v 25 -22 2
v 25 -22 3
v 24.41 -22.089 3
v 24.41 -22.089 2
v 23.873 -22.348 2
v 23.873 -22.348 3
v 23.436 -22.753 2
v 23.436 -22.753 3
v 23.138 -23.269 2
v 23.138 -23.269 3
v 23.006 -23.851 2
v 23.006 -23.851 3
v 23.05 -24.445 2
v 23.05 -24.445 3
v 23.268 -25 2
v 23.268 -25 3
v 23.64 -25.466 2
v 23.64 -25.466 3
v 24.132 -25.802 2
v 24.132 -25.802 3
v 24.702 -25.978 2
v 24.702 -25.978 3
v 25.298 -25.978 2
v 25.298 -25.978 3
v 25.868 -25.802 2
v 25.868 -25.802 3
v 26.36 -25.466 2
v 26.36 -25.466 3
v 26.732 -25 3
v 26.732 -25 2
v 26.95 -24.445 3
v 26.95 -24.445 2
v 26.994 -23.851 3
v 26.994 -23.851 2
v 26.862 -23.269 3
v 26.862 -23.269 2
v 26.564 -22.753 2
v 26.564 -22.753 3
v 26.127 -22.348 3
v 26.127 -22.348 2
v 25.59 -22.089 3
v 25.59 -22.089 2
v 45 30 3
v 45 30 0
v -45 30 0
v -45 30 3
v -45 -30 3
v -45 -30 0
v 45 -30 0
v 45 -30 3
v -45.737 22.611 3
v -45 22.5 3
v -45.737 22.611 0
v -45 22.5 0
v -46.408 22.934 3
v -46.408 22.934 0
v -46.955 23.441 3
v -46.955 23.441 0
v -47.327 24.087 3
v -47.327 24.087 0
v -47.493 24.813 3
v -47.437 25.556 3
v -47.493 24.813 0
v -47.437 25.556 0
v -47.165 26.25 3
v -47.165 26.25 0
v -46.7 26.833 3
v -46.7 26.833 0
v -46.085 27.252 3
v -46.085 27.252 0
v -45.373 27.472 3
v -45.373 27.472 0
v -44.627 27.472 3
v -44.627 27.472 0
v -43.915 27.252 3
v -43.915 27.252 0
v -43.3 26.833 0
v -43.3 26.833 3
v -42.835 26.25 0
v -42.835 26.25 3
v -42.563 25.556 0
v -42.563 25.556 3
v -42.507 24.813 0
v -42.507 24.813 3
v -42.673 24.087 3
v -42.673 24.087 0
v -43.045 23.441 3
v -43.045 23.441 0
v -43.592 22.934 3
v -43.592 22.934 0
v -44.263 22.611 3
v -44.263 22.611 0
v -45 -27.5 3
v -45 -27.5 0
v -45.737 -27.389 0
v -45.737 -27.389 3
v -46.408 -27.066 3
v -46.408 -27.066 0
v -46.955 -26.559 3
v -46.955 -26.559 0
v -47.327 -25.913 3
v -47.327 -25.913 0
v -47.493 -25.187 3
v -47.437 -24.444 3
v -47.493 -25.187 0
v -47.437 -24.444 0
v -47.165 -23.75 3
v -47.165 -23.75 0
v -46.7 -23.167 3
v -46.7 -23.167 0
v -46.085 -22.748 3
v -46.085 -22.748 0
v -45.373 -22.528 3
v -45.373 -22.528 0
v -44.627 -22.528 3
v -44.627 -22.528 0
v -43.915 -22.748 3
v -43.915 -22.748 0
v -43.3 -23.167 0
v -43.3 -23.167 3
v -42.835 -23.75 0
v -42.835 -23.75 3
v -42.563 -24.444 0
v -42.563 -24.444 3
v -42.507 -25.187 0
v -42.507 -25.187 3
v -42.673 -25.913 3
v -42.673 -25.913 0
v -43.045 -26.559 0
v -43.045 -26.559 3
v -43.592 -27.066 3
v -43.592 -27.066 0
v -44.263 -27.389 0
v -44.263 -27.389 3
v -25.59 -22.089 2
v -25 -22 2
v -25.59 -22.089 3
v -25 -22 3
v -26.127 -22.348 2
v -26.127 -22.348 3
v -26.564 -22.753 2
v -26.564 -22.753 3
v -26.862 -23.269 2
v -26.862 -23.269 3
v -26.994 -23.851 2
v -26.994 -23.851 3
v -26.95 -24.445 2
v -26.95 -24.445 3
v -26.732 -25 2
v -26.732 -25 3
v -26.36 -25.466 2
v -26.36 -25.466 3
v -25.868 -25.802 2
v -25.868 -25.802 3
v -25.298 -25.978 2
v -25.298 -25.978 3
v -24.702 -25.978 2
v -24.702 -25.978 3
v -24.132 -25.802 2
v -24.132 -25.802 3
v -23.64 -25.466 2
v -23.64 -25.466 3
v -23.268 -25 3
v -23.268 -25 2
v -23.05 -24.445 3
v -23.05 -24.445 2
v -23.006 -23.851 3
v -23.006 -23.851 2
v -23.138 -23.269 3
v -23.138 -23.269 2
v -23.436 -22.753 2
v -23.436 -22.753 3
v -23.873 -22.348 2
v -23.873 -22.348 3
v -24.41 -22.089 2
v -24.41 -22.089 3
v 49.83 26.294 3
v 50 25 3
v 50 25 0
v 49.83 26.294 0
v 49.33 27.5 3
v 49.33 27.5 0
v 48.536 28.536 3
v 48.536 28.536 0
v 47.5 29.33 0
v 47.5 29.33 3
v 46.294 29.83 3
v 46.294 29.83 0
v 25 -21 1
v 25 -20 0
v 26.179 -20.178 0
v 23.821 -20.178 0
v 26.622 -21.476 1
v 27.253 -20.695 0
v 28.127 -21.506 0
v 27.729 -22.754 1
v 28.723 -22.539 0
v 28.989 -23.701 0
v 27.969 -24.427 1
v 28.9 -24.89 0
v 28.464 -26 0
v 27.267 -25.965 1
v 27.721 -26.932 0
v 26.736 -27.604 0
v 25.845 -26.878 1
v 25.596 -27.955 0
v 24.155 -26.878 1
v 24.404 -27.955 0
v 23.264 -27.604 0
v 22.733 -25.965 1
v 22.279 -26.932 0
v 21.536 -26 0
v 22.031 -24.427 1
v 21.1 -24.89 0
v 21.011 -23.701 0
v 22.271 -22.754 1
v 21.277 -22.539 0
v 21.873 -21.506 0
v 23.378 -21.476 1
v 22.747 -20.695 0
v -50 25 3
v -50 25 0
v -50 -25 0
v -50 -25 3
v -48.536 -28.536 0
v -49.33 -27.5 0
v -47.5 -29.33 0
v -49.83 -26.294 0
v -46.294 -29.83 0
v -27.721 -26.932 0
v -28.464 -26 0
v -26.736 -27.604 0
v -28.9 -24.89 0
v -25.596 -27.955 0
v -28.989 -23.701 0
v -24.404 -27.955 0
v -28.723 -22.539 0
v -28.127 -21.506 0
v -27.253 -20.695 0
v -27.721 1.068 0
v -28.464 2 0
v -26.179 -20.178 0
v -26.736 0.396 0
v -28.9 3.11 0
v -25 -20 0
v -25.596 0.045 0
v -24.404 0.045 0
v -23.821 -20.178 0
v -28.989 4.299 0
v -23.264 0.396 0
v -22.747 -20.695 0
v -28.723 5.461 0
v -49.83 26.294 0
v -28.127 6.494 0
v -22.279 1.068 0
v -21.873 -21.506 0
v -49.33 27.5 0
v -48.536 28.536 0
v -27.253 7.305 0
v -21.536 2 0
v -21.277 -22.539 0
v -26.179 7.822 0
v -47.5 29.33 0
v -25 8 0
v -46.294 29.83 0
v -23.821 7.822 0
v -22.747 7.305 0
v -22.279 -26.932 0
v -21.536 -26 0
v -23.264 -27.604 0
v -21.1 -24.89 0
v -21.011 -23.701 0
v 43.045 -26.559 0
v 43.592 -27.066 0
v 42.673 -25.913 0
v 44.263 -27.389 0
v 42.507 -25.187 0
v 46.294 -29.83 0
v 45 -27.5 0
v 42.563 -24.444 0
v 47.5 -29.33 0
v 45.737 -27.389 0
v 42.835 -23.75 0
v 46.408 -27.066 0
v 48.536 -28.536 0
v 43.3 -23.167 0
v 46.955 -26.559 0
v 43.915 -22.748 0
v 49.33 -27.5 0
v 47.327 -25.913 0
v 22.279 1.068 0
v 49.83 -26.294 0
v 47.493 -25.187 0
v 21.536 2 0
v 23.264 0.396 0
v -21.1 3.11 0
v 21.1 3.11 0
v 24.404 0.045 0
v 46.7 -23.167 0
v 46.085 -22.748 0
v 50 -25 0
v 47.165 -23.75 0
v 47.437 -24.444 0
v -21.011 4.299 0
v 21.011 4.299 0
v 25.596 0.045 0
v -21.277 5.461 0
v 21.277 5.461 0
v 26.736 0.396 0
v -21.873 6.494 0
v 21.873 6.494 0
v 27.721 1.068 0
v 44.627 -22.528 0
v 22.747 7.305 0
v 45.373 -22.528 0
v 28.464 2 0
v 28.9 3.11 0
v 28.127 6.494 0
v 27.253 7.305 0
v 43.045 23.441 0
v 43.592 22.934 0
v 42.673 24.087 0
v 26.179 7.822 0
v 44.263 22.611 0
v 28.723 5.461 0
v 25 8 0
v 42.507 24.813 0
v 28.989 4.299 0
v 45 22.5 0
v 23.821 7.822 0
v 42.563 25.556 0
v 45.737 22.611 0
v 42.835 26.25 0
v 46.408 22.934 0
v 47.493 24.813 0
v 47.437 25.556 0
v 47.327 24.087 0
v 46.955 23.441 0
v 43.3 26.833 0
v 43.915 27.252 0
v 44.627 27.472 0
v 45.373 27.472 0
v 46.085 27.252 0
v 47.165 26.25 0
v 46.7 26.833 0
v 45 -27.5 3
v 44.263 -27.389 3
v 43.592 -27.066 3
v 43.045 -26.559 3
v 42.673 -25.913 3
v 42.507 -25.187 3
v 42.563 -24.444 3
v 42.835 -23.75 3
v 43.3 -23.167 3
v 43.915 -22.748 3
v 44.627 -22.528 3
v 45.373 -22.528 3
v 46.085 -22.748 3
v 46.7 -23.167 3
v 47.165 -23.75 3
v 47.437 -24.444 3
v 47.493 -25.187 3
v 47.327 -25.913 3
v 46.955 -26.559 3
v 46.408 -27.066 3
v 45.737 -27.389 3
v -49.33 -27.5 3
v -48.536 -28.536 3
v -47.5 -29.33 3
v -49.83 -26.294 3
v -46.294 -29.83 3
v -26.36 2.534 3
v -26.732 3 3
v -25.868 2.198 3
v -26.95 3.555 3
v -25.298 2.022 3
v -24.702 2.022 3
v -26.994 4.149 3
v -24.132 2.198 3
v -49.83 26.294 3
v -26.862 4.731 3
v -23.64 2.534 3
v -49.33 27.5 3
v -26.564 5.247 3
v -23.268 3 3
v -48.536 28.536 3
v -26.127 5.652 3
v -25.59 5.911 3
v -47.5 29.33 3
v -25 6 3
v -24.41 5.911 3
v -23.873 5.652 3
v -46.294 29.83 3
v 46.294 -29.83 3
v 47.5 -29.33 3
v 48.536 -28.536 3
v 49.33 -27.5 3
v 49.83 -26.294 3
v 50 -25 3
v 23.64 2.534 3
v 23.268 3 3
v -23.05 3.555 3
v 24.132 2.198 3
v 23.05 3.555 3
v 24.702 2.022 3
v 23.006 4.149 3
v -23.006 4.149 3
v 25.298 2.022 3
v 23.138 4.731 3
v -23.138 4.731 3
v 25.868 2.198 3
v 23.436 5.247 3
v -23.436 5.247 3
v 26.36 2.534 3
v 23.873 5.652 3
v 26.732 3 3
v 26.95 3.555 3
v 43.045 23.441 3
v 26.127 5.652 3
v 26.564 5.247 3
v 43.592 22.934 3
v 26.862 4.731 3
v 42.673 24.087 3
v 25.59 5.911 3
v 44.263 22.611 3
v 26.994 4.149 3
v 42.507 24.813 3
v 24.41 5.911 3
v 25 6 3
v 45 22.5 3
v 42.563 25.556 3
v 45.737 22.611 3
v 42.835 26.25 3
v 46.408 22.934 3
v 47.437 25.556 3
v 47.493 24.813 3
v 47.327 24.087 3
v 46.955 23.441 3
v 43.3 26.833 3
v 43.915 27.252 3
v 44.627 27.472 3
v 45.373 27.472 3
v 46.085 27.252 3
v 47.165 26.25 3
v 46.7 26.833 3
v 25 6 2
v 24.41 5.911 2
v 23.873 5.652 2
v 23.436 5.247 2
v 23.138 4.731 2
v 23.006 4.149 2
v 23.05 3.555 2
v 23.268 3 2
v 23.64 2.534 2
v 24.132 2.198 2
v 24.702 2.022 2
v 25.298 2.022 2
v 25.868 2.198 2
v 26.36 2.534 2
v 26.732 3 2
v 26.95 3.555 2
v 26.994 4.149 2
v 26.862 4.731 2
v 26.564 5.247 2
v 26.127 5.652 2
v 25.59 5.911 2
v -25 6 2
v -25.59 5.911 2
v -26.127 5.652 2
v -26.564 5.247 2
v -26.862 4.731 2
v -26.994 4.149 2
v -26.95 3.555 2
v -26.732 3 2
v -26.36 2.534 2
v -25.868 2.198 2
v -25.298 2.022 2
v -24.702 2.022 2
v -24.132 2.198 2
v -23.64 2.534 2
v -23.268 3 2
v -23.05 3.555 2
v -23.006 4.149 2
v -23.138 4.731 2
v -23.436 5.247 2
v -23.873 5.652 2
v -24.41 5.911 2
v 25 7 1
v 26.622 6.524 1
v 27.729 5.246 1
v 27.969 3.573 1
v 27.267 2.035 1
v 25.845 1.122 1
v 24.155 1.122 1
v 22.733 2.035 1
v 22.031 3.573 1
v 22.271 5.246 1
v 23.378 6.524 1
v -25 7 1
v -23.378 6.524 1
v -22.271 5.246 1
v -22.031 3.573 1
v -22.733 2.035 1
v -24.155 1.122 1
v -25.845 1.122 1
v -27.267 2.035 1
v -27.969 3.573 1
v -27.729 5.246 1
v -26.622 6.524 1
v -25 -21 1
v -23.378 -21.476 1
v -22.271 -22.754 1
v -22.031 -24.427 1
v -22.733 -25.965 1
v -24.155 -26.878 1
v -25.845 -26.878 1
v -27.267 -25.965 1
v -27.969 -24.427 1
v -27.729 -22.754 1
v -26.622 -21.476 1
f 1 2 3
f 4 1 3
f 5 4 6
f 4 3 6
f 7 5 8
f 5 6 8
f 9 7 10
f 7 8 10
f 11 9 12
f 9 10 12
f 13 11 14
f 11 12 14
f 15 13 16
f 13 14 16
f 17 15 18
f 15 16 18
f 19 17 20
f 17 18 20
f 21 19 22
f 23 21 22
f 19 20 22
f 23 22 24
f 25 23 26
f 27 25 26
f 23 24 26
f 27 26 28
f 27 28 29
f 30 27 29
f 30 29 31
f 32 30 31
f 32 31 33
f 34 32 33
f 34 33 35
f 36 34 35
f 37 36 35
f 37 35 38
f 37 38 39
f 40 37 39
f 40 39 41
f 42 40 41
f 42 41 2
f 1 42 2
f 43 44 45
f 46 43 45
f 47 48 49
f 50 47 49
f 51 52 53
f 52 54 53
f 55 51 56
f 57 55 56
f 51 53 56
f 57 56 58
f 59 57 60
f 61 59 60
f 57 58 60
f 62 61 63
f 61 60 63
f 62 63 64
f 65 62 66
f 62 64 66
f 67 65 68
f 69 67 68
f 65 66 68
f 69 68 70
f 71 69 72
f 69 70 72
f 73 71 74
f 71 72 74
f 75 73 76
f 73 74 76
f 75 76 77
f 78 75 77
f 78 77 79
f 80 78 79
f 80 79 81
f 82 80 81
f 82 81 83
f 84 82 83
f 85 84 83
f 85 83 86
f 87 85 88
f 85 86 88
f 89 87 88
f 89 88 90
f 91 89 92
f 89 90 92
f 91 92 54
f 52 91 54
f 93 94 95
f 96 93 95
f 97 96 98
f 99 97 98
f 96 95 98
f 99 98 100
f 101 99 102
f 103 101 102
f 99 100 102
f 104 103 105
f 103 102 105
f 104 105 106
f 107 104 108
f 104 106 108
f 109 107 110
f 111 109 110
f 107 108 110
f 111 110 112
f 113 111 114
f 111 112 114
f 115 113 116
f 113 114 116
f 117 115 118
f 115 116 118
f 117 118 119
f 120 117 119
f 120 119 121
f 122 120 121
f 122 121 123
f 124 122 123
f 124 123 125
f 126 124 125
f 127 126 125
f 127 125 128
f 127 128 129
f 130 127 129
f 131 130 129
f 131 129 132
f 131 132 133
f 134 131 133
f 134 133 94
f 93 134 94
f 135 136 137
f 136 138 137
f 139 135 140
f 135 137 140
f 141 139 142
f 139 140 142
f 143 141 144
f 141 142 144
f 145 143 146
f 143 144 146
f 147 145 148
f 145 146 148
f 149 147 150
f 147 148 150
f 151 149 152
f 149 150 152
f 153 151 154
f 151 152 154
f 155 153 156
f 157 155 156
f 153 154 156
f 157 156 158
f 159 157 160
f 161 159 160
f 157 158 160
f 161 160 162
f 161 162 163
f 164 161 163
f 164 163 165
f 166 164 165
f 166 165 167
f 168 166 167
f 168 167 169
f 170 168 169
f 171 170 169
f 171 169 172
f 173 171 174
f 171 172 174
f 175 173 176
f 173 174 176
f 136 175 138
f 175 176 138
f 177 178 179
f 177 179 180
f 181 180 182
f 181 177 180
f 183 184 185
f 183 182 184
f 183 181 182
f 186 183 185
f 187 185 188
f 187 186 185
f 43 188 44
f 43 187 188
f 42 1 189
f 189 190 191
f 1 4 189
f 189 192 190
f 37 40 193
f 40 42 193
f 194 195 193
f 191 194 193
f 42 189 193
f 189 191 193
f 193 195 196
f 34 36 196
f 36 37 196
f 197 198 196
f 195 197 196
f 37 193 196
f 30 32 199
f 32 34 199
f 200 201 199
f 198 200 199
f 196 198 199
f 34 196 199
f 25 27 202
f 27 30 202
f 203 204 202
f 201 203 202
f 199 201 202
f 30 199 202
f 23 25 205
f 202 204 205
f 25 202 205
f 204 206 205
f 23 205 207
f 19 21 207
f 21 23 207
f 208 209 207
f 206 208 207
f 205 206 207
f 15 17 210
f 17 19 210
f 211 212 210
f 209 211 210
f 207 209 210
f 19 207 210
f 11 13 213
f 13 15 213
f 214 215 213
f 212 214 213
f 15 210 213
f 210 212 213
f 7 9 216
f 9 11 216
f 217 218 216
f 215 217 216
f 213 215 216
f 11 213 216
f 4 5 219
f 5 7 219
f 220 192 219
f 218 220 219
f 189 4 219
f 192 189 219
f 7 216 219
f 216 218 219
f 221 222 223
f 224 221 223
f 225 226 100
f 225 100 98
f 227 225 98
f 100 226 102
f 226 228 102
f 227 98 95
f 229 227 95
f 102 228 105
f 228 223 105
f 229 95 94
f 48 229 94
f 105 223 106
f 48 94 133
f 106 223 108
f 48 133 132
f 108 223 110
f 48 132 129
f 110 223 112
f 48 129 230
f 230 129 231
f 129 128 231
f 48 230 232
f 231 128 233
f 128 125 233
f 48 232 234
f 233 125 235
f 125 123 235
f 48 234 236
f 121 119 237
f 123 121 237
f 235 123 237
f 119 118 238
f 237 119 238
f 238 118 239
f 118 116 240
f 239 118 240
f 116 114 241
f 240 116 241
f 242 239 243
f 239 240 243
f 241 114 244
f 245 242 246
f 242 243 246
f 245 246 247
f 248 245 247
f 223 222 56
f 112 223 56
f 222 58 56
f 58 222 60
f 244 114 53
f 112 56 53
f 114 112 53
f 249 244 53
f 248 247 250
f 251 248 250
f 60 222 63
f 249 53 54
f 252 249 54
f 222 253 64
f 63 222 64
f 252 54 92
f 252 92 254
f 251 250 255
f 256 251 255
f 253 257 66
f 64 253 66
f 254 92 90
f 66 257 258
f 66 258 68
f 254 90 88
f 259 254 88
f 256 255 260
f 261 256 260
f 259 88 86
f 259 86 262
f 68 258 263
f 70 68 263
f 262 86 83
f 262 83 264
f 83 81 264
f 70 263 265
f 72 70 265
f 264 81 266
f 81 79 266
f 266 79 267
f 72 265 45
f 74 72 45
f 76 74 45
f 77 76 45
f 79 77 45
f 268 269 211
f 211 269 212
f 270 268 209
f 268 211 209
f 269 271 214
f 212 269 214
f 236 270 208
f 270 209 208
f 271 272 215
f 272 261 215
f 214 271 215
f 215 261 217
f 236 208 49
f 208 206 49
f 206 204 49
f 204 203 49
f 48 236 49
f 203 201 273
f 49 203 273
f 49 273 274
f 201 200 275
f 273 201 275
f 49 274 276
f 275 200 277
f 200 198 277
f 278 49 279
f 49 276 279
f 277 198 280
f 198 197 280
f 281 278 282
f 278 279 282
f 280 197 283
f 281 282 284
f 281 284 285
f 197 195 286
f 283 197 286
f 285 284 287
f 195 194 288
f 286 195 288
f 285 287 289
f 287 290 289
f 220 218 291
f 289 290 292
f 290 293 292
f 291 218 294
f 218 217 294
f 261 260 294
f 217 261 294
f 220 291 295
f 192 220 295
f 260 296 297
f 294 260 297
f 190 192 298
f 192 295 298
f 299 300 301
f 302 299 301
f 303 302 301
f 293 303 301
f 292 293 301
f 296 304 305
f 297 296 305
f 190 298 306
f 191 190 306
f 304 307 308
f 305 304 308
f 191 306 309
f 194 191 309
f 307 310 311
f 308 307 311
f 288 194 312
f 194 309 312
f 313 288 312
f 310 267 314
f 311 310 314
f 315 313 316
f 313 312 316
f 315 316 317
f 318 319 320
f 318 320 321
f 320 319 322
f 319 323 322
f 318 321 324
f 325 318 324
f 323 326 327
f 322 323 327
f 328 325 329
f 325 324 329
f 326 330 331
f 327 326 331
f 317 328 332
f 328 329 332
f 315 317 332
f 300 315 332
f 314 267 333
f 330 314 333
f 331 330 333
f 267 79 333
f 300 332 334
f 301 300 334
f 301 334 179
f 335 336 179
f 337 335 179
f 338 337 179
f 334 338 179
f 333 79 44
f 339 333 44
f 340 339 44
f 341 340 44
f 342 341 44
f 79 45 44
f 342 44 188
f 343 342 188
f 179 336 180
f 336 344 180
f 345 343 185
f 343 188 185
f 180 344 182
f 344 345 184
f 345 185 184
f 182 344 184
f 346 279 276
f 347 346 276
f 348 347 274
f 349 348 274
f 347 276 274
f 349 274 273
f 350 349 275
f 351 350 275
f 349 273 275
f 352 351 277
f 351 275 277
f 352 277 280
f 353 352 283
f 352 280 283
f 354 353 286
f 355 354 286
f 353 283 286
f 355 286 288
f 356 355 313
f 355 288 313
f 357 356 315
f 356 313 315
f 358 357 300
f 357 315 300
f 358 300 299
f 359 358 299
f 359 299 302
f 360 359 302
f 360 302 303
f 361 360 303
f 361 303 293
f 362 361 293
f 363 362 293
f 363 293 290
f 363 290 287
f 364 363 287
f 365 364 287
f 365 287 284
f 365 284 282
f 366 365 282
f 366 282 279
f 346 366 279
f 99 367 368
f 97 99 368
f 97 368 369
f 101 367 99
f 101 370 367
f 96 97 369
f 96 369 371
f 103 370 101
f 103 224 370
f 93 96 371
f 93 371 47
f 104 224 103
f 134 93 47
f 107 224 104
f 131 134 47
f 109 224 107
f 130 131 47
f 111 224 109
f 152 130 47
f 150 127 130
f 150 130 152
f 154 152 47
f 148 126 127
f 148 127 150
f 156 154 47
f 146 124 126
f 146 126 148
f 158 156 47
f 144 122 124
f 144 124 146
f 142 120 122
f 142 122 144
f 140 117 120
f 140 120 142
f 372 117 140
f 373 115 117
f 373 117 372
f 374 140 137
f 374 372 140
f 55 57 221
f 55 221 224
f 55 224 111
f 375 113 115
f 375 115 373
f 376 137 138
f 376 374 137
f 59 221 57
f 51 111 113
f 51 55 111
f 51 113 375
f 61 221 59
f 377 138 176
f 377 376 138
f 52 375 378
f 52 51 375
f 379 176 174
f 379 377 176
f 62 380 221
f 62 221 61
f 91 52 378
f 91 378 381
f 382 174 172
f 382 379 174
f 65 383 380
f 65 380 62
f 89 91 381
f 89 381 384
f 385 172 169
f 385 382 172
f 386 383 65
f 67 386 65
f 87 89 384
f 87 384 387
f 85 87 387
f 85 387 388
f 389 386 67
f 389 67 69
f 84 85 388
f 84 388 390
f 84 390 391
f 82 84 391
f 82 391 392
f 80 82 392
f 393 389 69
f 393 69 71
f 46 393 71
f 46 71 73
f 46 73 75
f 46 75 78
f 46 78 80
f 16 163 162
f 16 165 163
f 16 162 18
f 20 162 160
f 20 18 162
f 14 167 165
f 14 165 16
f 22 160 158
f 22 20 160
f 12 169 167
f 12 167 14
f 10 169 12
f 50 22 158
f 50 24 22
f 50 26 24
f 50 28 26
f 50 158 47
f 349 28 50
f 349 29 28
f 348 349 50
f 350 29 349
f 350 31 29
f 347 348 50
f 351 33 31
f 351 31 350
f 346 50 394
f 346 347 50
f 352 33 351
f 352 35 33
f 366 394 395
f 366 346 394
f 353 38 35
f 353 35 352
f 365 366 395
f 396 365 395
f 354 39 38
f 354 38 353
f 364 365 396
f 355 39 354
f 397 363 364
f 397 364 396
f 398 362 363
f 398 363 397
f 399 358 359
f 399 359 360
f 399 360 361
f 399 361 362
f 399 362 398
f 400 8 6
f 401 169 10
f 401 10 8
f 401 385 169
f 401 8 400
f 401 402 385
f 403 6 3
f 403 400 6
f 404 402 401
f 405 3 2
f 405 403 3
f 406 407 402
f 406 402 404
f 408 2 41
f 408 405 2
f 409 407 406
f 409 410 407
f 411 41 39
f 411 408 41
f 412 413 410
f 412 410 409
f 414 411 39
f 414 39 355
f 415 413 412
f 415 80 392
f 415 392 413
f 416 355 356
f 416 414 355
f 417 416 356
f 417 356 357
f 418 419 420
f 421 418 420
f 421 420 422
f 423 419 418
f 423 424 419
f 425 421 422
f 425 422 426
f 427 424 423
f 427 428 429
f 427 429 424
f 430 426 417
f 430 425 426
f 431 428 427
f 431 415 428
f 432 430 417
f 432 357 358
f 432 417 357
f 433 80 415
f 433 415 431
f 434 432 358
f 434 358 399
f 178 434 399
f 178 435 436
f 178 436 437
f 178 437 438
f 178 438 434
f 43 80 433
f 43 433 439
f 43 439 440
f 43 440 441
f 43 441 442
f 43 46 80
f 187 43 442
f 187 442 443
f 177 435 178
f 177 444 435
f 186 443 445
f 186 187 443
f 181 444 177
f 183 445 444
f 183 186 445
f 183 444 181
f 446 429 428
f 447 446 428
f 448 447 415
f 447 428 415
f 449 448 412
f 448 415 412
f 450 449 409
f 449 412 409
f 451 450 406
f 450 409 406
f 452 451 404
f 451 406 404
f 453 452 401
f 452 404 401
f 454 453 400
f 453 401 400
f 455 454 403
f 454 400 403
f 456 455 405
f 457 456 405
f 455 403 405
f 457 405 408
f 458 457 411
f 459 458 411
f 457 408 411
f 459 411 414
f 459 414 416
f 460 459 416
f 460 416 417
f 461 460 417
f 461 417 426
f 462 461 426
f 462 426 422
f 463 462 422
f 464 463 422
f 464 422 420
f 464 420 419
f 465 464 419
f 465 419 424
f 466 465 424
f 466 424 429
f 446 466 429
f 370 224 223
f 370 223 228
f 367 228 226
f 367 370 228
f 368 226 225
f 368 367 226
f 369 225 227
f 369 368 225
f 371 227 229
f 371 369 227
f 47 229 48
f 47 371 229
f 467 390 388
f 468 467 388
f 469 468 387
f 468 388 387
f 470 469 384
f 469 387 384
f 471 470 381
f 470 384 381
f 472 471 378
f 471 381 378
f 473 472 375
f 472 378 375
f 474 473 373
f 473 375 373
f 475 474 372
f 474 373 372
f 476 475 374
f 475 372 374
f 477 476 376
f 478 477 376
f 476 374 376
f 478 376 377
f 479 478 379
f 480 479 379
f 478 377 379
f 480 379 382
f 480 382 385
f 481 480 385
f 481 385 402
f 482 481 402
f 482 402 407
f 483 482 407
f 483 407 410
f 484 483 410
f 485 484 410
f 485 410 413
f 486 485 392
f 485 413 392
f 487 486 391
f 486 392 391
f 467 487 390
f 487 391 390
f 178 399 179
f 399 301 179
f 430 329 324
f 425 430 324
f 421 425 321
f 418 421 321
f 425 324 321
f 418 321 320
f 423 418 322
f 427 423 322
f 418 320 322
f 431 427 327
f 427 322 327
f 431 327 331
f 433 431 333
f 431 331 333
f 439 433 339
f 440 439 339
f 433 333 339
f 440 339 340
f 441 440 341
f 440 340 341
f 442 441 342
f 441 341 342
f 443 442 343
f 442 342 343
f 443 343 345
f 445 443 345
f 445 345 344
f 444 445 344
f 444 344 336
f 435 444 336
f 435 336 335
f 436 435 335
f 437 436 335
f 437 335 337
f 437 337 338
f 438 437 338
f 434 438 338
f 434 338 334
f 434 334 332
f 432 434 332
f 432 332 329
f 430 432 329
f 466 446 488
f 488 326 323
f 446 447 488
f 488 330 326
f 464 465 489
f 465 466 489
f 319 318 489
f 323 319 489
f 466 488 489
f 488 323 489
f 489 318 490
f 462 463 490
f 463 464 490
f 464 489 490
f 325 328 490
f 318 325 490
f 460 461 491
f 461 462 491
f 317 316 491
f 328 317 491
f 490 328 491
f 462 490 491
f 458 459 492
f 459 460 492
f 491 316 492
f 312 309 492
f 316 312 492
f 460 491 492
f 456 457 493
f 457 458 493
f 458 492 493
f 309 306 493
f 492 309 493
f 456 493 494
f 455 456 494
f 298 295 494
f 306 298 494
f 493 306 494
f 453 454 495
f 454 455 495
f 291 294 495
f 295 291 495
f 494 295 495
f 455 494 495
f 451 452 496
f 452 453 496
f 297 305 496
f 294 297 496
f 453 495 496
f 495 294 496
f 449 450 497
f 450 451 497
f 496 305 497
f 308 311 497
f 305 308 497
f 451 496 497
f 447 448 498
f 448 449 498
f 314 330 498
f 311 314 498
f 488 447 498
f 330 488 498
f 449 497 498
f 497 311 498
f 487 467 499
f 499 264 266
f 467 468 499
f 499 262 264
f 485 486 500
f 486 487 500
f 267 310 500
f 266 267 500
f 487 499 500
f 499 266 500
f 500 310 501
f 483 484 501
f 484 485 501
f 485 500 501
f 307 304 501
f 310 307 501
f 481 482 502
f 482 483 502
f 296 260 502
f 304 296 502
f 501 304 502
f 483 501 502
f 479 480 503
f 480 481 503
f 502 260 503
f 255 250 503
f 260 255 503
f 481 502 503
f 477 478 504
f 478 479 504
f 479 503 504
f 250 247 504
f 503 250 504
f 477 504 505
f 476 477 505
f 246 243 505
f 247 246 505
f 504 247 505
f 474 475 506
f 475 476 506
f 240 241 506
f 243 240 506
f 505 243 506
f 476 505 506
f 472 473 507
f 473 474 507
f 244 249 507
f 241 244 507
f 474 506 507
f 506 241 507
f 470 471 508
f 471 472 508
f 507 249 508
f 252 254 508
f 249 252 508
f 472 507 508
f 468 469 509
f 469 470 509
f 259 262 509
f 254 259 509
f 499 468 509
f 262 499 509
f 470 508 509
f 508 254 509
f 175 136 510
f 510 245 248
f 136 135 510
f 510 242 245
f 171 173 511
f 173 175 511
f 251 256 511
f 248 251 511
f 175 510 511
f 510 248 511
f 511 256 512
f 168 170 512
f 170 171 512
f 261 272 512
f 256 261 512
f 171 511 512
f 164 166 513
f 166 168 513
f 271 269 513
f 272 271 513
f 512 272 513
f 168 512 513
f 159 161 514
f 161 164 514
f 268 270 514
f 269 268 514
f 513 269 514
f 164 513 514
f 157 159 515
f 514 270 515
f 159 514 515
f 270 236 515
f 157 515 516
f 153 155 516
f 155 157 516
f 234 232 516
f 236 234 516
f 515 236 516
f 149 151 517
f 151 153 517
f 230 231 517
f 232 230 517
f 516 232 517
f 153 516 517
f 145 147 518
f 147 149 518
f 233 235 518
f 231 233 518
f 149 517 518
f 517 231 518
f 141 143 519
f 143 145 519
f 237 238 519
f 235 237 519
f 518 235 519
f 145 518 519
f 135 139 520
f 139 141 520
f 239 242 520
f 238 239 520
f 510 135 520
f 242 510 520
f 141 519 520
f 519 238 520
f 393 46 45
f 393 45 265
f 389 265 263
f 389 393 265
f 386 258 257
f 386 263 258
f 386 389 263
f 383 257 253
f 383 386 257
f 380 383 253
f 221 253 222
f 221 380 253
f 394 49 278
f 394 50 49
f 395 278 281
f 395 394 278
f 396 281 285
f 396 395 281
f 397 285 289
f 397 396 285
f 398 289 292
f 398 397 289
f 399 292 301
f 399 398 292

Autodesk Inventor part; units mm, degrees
ref_plane "YZ Plane" through (0, 0, 0) normal (1, 0, 0) x (0, 1, 0)
ref_plane "XZ Plane" through (0, 0, 0) normal (0, 1, 0) x (-1, 0, 0)
ref_plane "XY Plane" through (0, 0, 0) normal (0, 0, 1) x (1, 0, 0)
sketch "Sketch1" plane through (0, 0, 0) normal (0, 0, 1) x (1, 0, 0)
  line L0 (-50, -30) -> (50, -30)
  line L1 (50, -30) -> (50, 30)
  line L2 (50, 30) -> (-50, 30)
  line L3 (-50, 30) -> (-50, -30)
  line L4 (-50, -30) -> (50, 30) construction
  line L5 (50, -30) -> (-50, 30) construction
  point P0 (0, 0)
  dimension "d0" = 60
  dimension "d1" = 100
extrude "Plate1" add sketch "Sketch1" along normal blind 3
sketch "Sketch2" plane through (0, 0, 3) normal (0, 0, 1) x (1, 0, 0)
  line L0 (-50, -30) -> (-50, 30) projected
  line L1 (-50, 30) -> (50, 30) projected
  line L2 (50, -30) -> (-50, -30) projected
  line L3 (50, 30) -> (50, -30) projected
  point P0 (0, 0)
  point P1 (-45, 25)
  point P2 (45, 25)
  point P3 (45, -25)
  point P4 (-45, -25)
  dimension "d3" = 5
  dimension "d4" = 5
  dimension "d5" = 5
  dimension "d6" = 5
  dimension "d7" = 5
hole "Hole1" at (-45, 25, 3) at (45, 25, 3) at (45, -25, 3) at (-45, -25, 3) direction (0, 0, -1) diameter 5 depth 3
sketch "Sketch3" plane through (0, 0, 0) normal (0, 0, 1) x (1, 0, 0)
  line L0 (50, -30) -> (-50, -30) projected
  point P0 (0, 0)
  point P1 (-25, 4)
  point P2 (25, 4)
  point P3 (25, -24)
  point P4 (-25, -24)
  dimension "d15" = 28
  dimension "d16" = 6
  dimension "d17" = 50
  dimension "d18" = 25
hole "Hole2" at (-25, 4, 0) at (25, 4, 0) at (25, -24, 0) at (-25, -24, 0) direction (0, 0, 1) diameter 4 depth 3 countersink diameter 8 countersink angle 90
fillet "Fillet1" radius 5 4 edges at (-50, 30, 1.5) (-50, -30, 1.5) (50, -30, 1.5) (50, 30, 1.5)
equation "\"d5\" = d4"
equation "\"d6\" = d3"
equation "\"d7\" = d6"
equation "\"d13\" = Stärke"
equation "\"d2\" = Stärke"
equation "\"d18\" = 0.5 * d17"
equation "\"Biegeradius\" = Stärke"
equation "\"BreiteBiegungsfreistellung\" = Stärke"
equation "\"TiefeBiegungsfreistellung\" = 0.5 * Stärke"
equation "\"GrößeEckenfreistellung\" = 4 * Stärke"
equation "\"MinimalRest\" = 2 * Stärke"
equation "\"Übergangsradius\" = Biegeradius"
equation "\"JacobiRadiusGröße\" = Biegeradius"
equation "\"Abstandsgröße\" = Stärke"
equation "\"Stärke\" = 3"
properties part number "02"
